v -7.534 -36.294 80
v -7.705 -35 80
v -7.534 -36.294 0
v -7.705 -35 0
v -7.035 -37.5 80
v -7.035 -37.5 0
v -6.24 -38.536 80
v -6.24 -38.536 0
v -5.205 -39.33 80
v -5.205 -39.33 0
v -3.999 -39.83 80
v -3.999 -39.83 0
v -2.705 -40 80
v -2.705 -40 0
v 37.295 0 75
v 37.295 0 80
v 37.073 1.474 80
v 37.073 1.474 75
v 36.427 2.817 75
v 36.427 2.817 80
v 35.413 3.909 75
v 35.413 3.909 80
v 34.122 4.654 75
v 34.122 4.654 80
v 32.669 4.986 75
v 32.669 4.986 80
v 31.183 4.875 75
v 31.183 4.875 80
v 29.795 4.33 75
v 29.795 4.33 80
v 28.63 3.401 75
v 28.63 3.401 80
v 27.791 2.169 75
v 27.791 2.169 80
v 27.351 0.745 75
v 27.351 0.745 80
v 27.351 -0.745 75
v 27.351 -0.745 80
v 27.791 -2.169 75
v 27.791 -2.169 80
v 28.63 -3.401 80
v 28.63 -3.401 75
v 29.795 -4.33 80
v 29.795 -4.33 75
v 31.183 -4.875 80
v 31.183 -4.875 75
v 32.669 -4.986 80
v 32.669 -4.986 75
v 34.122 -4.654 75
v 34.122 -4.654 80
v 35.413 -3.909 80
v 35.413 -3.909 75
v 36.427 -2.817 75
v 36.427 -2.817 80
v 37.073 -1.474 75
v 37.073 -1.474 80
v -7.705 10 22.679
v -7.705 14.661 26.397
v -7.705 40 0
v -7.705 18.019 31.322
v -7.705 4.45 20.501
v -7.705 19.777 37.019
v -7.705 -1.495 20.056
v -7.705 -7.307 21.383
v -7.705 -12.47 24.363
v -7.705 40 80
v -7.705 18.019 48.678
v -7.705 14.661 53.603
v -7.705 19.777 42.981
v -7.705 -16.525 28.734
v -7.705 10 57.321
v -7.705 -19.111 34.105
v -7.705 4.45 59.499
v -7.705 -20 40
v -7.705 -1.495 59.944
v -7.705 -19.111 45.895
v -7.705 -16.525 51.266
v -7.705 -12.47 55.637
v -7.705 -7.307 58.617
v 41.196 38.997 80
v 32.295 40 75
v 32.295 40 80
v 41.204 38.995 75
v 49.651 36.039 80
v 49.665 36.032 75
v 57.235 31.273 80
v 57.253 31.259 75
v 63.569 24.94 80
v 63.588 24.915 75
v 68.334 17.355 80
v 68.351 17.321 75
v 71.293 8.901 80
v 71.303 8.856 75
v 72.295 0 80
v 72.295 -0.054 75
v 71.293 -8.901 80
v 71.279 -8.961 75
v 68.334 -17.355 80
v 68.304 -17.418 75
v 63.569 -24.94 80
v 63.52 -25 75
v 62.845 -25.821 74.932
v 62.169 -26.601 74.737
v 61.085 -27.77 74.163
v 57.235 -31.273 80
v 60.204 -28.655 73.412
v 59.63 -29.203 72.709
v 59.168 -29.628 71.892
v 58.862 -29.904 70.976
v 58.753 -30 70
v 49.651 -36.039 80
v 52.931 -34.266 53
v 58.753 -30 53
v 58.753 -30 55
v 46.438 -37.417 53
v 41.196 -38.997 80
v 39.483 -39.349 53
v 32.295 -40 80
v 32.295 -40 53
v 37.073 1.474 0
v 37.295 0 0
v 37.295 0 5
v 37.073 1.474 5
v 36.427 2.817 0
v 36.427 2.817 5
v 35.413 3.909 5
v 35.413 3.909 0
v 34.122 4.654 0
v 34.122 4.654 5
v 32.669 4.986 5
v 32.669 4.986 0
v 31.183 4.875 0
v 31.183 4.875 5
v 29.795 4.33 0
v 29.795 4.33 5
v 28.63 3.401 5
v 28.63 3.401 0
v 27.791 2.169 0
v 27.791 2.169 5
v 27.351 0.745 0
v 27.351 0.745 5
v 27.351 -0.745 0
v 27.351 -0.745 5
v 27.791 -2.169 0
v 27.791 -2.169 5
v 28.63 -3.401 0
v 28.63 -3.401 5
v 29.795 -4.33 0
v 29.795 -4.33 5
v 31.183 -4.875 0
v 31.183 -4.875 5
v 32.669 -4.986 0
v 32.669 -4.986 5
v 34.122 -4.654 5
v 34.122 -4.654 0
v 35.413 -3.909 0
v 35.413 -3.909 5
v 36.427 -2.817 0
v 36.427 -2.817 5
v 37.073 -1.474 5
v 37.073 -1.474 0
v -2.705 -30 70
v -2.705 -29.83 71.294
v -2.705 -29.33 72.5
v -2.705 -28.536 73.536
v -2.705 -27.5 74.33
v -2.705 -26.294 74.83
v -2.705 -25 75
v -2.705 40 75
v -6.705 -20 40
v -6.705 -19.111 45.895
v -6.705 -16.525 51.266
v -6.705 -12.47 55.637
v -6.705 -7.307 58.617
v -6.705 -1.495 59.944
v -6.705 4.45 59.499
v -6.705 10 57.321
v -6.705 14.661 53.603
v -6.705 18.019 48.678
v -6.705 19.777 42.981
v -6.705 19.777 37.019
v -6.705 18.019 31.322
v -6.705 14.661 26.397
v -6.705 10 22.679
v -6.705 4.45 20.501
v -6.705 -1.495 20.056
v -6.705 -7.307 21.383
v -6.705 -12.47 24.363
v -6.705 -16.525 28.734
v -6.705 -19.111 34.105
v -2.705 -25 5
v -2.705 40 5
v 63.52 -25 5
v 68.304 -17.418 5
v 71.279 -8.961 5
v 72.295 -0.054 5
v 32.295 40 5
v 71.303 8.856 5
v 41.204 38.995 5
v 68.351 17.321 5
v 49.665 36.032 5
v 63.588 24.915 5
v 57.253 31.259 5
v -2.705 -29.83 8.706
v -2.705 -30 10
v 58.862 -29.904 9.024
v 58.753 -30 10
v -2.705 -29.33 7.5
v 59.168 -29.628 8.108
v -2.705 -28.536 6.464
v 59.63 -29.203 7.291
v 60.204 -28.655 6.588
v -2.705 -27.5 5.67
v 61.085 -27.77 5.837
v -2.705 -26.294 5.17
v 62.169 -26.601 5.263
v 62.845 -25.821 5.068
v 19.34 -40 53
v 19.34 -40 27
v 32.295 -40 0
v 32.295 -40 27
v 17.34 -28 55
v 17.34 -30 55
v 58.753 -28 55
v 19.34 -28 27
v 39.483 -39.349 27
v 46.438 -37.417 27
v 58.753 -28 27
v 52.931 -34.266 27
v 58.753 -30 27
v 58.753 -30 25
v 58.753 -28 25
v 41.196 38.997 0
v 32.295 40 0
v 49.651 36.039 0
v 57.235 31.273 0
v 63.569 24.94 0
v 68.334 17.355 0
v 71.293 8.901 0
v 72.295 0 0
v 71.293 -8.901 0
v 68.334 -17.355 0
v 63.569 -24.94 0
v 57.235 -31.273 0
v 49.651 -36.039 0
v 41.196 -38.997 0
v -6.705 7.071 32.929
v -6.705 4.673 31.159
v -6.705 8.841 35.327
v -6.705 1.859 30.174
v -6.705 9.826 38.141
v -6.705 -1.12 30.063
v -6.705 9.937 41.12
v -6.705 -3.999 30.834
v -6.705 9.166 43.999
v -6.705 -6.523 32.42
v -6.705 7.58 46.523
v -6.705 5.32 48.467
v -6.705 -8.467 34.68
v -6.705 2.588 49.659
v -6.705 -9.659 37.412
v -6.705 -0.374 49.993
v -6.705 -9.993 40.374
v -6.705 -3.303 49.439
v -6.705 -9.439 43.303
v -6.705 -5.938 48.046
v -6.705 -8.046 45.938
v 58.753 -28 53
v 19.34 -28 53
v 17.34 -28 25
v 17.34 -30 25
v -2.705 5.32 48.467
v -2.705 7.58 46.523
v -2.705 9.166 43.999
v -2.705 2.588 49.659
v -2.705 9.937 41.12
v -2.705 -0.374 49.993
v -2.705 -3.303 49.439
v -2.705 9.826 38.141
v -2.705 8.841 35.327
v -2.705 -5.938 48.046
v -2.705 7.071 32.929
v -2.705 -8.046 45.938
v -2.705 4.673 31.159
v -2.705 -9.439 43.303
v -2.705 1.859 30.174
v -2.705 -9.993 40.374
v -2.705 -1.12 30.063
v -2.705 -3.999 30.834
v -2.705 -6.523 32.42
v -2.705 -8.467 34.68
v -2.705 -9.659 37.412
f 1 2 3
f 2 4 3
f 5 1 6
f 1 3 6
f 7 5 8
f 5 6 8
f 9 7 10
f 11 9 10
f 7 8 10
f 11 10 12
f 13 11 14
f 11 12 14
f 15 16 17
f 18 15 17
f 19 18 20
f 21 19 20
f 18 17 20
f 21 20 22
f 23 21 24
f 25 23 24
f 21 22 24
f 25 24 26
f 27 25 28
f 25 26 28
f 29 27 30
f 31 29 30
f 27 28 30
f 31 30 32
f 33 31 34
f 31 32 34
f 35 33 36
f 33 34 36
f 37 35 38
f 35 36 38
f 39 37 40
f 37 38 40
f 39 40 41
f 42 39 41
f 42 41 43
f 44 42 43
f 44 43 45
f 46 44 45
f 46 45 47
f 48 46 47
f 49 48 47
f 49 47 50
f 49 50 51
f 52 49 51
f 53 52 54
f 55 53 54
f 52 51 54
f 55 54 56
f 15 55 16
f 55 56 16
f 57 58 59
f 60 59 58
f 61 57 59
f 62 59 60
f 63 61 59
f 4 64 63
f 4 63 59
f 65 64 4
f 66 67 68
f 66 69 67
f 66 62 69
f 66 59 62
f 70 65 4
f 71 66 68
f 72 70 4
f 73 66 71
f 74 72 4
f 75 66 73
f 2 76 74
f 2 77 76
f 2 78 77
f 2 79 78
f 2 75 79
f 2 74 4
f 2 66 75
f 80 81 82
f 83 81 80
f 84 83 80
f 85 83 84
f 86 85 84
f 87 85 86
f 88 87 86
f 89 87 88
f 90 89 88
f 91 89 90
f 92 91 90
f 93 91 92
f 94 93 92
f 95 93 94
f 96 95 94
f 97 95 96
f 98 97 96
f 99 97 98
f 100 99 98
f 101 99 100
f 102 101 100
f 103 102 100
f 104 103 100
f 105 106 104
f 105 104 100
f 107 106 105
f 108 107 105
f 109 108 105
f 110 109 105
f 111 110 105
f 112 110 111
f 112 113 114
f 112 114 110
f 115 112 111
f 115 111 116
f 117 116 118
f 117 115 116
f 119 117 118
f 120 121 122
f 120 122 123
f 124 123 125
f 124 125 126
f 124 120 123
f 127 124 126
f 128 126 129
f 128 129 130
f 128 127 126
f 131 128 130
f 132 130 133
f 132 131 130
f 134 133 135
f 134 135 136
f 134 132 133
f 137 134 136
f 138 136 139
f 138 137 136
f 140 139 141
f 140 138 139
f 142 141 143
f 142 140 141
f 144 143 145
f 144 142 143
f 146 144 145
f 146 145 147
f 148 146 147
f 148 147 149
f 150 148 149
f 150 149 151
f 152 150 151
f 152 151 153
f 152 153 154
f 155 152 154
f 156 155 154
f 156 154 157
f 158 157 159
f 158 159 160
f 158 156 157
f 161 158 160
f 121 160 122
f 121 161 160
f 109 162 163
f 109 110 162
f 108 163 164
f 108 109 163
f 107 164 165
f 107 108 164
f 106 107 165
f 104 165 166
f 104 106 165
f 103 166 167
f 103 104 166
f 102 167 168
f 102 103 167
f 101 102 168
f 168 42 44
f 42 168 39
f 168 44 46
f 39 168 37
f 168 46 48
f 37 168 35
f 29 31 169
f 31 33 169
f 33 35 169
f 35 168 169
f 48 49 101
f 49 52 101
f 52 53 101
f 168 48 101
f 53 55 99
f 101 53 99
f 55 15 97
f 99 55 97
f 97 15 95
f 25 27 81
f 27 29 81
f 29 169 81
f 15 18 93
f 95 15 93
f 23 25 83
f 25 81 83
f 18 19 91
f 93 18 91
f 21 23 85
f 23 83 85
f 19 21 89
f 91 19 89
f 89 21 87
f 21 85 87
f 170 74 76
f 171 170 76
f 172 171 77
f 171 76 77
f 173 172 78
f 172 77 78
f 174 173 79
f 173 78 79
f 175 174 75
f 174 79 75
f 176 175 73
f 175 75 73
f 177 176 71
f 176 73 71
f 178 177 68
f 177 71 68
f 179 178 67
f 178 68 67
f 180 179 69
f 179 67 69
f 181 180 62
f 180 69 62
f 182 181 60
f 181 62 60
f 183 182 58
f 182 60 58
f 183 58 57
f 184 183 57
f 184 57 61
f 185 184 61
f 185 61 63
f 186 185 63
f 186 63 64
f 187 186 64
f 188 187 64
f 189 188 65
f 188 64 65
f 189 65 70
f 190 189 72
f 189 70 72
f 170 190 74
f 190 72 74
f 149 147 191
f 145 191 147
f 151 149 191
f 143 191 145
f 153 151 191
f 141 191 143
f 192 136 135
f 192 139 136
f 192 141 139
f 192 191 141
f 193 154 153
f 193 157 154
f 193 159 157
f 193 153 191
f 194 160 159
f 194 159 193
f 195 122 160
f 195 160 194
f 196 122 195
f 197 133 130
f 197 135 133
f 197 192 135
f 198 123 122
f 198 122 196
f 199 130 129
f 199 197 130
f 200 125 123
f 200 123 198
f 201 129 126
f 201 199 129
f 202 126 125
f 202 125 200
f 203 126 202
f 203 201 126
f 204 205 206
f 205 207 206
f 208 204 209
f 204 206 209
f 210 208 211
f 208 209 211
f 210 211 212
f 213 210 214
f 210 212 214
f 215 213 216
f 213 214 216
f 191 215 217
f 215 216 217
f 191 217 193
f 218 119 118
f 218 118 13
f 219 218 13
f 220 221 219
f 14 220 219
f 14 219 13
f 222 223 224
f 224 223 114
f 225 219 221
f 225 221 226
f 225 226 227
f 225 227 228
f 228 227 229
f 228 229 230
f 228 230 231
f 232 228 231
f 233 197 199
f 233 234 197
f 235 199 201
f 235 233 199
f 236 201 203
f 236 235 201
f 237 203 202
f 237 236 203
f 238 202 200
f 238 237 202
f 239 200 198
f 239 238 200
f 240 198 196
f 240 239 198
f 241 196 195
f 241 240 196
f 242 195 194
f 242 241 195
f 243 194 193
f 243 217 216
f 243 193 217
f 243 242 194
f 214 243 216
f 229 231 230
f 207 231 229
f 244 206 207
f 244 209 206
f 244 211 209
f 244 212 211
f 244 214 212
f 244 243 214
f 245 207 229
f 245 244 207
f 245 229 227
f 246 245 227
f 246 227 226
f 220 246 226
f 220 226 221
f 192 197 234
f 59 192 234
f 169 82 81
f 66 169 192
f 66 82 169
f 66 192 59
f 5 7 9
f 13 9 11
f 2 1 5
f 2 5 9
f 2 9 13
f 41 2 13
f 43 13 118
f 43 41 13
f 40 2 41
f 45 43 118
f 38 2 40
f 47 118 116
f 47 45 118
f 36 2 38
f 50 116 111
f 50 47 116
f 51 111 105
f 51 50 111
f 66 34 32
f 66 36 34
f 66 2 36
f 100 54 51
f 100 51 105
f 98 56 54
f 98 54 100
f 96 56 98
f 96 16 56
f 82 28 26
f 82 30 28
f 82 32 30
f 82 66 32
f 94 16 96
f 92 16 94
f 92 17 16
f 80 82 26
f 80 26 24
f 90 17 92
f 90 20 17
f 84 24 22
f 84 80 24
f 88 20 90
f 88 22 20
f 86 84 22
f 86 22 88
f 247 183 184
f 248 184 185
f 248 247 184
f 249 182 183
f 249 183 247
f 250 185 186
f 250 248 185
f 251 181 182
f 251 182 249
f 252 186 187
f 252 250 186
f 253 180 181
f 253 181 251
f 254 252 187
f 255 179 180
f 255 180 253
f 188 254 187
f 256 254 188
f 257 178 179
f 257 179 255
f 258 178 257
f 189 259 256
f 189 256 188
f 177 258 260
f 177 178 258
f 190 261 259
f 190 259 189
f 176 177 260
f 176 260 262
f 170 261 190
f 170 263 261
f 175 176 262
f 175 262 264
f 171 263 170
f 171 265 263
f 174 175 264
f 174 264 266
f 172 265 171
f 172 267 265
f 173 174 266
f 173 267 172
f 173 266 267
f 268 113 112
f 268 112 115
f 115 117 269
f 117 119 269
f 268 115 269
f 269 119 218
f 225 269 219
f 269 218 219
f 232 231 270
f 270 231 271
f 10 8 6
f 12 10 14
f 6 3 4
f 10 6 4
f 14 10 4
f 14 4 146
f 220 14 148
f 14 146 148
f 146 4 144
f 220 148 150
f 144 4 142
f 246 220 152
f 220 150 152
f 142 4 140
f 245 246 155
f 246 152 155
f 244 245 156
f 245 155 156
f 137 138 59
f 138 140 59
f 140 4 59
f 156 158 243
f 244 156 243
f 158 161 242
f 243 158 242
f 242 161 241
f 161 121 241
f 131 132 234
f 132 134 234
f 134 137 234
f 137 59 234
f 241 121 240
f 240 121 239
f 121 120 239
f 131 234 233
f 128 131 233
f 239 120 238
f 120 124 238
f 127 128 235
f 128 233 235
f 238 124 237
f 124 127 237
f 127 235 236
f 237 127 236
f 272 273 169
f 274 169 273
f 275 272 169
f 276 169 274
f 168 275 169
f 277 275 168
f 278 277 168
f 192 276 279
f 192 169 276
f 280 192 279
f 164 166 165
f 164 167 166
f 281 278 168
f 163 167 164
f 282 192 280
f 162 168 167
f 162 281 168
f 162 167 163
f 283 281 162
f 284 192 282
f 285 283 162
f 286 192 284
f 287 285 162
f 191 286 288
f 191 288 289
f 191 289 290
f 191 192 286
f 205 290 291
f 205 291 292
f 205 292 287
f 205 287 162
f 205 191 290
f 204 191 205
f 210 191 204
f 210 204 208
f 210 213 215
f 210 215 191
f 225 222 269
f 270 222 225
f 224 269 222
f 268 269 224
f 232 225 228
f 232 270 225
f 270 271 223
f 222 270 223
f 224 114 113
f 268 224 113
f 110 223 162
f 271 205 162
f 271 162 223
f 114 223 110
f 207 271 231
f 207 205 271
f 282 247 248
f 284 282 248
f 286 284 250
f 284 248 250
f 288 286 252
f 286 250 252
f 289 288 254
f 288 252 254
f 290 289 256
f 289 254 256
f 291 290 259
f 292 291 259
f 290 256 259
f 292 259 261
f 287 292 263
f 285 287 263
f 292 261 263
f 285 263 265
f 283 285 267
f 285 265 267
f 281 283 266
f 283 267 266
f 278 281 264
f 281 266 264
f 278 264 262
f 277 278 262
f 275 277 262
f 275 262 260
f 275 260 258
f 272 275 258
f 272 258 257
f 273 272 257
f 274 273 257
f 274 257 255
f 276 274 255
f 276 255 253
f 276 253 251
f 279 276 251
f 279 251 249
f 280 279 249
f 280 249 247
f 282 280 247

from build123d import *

# Parameters (mm, degrees)
SKETCH1_R           = 4.9999999999999964
BOSS_EXTRUDE1_DEPTH = 5
BOSS_EXTRUDE2_DEPTH = 70
BOSS_EXTRUDE3_DEPTH = 70
CUT_EXTRUDE1_DEPTH  = 5
SKETCH6_R           = 20.000000000000004
CUT_EXTRUDE2_DEPTH  = 1
CUT_EXTRUDE3_DEPTH  = 19.000000000000004
BOSS_EXTRUDE4_DEPTH = 1.9999999999999896
FILLET1_R           = 5


with BuildPart() as part:
    # Sketch1 → Boss-Extrude1 (new body)
    with BuildSketch(Plane.XY):
        with BuildLine():
            Line((-7.704615384615421, -40.00000000000001), (32.295384615384584, -40.00000000000001))
            ThreePointArc((32.295384615384584, -40.00000000000001), (72.29538461538459, 0), (32.29538461538458, 39.99999999999999))
            Line((32.29538461538458, 39.99999999999999), (-7.7046153846154315, 39.99999999999999))
            Line((-7.7046153846154315, 39.99999999999999), (-7.704615384615421, -40.00000000000001))
        make_face()
        with Locations((32.295384615384584, 0)):
            Circle(SKETCH1_R, mode=Mode.SUBTRACT)
    boss_extrude1 = extrude(amount=BOSS_EXTRUDE1_DEPTH)

    # Sketch2 → Boss-Extrude2 (add)
    with BuildSketch(Plane.XY.offset(5)):
        Polygon((-7.7046153846154315, 39.99999999999999), (-2.70461538461543, 39.99999999999999), (-2.7046153846154235, -40.00000000000001), (-7.704615384615421, -40.00000000000001), align=None)
    extrude(amount=BOSS_EXTRUDE2_DEPTH)

    # Mirror1: Boss-Extrude1 across plane
    add(boss_extrude1.mirror(Plane.XY.offset(40)))

    # Sketch4 → Boss-Extrude3 (add)
    with BuildSketch(Plane.XY.offset(5)):
        with BuildLine():
            Line((-2.7046153846154266, -40.00000000000001), (-2.7046153846154266, -30.000000000000007))
            Line((-2.7046153846154266, -30.000000000000007), (43.497251593214216, -30.000000000000007))
            Line((43.497251593214216, -30.000000000000007), (58.7528977260305, -30.000000000000007))
            ThreePointArc((58.7528977260305, -30.000000000000007), (46.43752023911554, -37.41657386773942), (32.295384615384584, -40.00000000000001))
            Line((32.295384615384584, -40.00000000000001), (-2.7046153846154266, -40.00000000000001))
        make_face()
    extrude(amount=BOSS_EXTRUDE3_DEPTH)

    # Sketch5 → Cut-Extrude1 (cut)
    with BuildSketch(Plane.ZY.offset(7.704615384615426)):
        with BuildLine():
            ThreePointArc((50.00000000000001, -1.388e-14), (43.82683432365097, 9.238795325112829), (32.92893218813463, 7.071067811865561))
            Line((32.92893218813452, 7.0710678118654755), (47.071067811865476, -7.071067811865483))
            ThreePointArc((47.0710678118656, -7.0710678118653725), (49.2387953251129, -3.826834323650836), (50.00000000000001, -1.633e-14))
        make_face()
        with BuildLine():
            Line((47.071067811865476, -7.071067811865483), (32.92893218813452, 7.0710678118654755))
            ThreePointArc((32.92893218813463, 7.071067811865561), (32.92893218813454, -7.071067811865502), (47.0710678118656, -7.0710678118653725))
        make_face()
    extrude(amount=-CUT_EXTRUDE1_DEPTH, mode=Mode.SUBTRACT)

    # Sketch6 → Cut-Extrude2 (cut)
    with BuildSketch(Plane.ZY.offset(7.704615384615426)):
        with Locations(Location((40.00000000000001, -1.388e-14, 0), (0, 0, 270))):
            Circle(SKETCH6_R)
    extrude(amount=-CUT_EXTRUDE2_DEPTH, mode=Mode.SUBTRACT)

    # Sketch7 → Cut-Extrude3 (cut)
    with BuildSketch(Plane(origin=(0, -30.000000000000007, 0), x_dir=(1, 0, 0), z_dir=(0, 1, 0))):
        Polygon((58.7528977260305, -53.00000000000001), (58.7528977260305, -40.00000000000001), (58.7528977260305, -27.000000000000004), (19.339689979409883, -27.000000000000007), (19.339689979409883, -53.00000000000001), align=None)
    extrude(amount=-CUT_EXTRUDE3_DEPTH, mode=Mode.SUBTRACT)

    # Sketch8 → Boss-Extrude4 (add)
    with BuildSketch(Plane(origin=(0, -30.000000000000007, 0), x_dir=(1, 0, 0), z_dir=(0, 1, 0))):
        Polygon((58.7528977260305, -53.00000000000001), (19.33968997940988, -53.00000000000001), (19.33968997940988, -27.000000000000007), (58.7528977260305, -27.000000000000004), (58.7528977260305, -25.000000000000007), (56.7528977260305, -25.000000000000007), (17.33968997940988, -25.000000000000007), (17.33968997940988, -55.00000000000001), (58.7528977260305, -55.00000000000001), align=None)
    extrude(amount=BOSS_EXTRUDE4_DEPTH)

    # Fillet1
    fillet1_edges = [part.edges().sort_by_distance(p)[0] for p in [
        (-7.704615384615421, -40.00000000000001, 40),
        (28.024141170707534, -30.000000000000007, 5),
        (28.024141170707537, -30.000000000000007, 75),
    ]]
    fillet(fillet1_edges, radius=FILLET1_R)


solid = part.part
